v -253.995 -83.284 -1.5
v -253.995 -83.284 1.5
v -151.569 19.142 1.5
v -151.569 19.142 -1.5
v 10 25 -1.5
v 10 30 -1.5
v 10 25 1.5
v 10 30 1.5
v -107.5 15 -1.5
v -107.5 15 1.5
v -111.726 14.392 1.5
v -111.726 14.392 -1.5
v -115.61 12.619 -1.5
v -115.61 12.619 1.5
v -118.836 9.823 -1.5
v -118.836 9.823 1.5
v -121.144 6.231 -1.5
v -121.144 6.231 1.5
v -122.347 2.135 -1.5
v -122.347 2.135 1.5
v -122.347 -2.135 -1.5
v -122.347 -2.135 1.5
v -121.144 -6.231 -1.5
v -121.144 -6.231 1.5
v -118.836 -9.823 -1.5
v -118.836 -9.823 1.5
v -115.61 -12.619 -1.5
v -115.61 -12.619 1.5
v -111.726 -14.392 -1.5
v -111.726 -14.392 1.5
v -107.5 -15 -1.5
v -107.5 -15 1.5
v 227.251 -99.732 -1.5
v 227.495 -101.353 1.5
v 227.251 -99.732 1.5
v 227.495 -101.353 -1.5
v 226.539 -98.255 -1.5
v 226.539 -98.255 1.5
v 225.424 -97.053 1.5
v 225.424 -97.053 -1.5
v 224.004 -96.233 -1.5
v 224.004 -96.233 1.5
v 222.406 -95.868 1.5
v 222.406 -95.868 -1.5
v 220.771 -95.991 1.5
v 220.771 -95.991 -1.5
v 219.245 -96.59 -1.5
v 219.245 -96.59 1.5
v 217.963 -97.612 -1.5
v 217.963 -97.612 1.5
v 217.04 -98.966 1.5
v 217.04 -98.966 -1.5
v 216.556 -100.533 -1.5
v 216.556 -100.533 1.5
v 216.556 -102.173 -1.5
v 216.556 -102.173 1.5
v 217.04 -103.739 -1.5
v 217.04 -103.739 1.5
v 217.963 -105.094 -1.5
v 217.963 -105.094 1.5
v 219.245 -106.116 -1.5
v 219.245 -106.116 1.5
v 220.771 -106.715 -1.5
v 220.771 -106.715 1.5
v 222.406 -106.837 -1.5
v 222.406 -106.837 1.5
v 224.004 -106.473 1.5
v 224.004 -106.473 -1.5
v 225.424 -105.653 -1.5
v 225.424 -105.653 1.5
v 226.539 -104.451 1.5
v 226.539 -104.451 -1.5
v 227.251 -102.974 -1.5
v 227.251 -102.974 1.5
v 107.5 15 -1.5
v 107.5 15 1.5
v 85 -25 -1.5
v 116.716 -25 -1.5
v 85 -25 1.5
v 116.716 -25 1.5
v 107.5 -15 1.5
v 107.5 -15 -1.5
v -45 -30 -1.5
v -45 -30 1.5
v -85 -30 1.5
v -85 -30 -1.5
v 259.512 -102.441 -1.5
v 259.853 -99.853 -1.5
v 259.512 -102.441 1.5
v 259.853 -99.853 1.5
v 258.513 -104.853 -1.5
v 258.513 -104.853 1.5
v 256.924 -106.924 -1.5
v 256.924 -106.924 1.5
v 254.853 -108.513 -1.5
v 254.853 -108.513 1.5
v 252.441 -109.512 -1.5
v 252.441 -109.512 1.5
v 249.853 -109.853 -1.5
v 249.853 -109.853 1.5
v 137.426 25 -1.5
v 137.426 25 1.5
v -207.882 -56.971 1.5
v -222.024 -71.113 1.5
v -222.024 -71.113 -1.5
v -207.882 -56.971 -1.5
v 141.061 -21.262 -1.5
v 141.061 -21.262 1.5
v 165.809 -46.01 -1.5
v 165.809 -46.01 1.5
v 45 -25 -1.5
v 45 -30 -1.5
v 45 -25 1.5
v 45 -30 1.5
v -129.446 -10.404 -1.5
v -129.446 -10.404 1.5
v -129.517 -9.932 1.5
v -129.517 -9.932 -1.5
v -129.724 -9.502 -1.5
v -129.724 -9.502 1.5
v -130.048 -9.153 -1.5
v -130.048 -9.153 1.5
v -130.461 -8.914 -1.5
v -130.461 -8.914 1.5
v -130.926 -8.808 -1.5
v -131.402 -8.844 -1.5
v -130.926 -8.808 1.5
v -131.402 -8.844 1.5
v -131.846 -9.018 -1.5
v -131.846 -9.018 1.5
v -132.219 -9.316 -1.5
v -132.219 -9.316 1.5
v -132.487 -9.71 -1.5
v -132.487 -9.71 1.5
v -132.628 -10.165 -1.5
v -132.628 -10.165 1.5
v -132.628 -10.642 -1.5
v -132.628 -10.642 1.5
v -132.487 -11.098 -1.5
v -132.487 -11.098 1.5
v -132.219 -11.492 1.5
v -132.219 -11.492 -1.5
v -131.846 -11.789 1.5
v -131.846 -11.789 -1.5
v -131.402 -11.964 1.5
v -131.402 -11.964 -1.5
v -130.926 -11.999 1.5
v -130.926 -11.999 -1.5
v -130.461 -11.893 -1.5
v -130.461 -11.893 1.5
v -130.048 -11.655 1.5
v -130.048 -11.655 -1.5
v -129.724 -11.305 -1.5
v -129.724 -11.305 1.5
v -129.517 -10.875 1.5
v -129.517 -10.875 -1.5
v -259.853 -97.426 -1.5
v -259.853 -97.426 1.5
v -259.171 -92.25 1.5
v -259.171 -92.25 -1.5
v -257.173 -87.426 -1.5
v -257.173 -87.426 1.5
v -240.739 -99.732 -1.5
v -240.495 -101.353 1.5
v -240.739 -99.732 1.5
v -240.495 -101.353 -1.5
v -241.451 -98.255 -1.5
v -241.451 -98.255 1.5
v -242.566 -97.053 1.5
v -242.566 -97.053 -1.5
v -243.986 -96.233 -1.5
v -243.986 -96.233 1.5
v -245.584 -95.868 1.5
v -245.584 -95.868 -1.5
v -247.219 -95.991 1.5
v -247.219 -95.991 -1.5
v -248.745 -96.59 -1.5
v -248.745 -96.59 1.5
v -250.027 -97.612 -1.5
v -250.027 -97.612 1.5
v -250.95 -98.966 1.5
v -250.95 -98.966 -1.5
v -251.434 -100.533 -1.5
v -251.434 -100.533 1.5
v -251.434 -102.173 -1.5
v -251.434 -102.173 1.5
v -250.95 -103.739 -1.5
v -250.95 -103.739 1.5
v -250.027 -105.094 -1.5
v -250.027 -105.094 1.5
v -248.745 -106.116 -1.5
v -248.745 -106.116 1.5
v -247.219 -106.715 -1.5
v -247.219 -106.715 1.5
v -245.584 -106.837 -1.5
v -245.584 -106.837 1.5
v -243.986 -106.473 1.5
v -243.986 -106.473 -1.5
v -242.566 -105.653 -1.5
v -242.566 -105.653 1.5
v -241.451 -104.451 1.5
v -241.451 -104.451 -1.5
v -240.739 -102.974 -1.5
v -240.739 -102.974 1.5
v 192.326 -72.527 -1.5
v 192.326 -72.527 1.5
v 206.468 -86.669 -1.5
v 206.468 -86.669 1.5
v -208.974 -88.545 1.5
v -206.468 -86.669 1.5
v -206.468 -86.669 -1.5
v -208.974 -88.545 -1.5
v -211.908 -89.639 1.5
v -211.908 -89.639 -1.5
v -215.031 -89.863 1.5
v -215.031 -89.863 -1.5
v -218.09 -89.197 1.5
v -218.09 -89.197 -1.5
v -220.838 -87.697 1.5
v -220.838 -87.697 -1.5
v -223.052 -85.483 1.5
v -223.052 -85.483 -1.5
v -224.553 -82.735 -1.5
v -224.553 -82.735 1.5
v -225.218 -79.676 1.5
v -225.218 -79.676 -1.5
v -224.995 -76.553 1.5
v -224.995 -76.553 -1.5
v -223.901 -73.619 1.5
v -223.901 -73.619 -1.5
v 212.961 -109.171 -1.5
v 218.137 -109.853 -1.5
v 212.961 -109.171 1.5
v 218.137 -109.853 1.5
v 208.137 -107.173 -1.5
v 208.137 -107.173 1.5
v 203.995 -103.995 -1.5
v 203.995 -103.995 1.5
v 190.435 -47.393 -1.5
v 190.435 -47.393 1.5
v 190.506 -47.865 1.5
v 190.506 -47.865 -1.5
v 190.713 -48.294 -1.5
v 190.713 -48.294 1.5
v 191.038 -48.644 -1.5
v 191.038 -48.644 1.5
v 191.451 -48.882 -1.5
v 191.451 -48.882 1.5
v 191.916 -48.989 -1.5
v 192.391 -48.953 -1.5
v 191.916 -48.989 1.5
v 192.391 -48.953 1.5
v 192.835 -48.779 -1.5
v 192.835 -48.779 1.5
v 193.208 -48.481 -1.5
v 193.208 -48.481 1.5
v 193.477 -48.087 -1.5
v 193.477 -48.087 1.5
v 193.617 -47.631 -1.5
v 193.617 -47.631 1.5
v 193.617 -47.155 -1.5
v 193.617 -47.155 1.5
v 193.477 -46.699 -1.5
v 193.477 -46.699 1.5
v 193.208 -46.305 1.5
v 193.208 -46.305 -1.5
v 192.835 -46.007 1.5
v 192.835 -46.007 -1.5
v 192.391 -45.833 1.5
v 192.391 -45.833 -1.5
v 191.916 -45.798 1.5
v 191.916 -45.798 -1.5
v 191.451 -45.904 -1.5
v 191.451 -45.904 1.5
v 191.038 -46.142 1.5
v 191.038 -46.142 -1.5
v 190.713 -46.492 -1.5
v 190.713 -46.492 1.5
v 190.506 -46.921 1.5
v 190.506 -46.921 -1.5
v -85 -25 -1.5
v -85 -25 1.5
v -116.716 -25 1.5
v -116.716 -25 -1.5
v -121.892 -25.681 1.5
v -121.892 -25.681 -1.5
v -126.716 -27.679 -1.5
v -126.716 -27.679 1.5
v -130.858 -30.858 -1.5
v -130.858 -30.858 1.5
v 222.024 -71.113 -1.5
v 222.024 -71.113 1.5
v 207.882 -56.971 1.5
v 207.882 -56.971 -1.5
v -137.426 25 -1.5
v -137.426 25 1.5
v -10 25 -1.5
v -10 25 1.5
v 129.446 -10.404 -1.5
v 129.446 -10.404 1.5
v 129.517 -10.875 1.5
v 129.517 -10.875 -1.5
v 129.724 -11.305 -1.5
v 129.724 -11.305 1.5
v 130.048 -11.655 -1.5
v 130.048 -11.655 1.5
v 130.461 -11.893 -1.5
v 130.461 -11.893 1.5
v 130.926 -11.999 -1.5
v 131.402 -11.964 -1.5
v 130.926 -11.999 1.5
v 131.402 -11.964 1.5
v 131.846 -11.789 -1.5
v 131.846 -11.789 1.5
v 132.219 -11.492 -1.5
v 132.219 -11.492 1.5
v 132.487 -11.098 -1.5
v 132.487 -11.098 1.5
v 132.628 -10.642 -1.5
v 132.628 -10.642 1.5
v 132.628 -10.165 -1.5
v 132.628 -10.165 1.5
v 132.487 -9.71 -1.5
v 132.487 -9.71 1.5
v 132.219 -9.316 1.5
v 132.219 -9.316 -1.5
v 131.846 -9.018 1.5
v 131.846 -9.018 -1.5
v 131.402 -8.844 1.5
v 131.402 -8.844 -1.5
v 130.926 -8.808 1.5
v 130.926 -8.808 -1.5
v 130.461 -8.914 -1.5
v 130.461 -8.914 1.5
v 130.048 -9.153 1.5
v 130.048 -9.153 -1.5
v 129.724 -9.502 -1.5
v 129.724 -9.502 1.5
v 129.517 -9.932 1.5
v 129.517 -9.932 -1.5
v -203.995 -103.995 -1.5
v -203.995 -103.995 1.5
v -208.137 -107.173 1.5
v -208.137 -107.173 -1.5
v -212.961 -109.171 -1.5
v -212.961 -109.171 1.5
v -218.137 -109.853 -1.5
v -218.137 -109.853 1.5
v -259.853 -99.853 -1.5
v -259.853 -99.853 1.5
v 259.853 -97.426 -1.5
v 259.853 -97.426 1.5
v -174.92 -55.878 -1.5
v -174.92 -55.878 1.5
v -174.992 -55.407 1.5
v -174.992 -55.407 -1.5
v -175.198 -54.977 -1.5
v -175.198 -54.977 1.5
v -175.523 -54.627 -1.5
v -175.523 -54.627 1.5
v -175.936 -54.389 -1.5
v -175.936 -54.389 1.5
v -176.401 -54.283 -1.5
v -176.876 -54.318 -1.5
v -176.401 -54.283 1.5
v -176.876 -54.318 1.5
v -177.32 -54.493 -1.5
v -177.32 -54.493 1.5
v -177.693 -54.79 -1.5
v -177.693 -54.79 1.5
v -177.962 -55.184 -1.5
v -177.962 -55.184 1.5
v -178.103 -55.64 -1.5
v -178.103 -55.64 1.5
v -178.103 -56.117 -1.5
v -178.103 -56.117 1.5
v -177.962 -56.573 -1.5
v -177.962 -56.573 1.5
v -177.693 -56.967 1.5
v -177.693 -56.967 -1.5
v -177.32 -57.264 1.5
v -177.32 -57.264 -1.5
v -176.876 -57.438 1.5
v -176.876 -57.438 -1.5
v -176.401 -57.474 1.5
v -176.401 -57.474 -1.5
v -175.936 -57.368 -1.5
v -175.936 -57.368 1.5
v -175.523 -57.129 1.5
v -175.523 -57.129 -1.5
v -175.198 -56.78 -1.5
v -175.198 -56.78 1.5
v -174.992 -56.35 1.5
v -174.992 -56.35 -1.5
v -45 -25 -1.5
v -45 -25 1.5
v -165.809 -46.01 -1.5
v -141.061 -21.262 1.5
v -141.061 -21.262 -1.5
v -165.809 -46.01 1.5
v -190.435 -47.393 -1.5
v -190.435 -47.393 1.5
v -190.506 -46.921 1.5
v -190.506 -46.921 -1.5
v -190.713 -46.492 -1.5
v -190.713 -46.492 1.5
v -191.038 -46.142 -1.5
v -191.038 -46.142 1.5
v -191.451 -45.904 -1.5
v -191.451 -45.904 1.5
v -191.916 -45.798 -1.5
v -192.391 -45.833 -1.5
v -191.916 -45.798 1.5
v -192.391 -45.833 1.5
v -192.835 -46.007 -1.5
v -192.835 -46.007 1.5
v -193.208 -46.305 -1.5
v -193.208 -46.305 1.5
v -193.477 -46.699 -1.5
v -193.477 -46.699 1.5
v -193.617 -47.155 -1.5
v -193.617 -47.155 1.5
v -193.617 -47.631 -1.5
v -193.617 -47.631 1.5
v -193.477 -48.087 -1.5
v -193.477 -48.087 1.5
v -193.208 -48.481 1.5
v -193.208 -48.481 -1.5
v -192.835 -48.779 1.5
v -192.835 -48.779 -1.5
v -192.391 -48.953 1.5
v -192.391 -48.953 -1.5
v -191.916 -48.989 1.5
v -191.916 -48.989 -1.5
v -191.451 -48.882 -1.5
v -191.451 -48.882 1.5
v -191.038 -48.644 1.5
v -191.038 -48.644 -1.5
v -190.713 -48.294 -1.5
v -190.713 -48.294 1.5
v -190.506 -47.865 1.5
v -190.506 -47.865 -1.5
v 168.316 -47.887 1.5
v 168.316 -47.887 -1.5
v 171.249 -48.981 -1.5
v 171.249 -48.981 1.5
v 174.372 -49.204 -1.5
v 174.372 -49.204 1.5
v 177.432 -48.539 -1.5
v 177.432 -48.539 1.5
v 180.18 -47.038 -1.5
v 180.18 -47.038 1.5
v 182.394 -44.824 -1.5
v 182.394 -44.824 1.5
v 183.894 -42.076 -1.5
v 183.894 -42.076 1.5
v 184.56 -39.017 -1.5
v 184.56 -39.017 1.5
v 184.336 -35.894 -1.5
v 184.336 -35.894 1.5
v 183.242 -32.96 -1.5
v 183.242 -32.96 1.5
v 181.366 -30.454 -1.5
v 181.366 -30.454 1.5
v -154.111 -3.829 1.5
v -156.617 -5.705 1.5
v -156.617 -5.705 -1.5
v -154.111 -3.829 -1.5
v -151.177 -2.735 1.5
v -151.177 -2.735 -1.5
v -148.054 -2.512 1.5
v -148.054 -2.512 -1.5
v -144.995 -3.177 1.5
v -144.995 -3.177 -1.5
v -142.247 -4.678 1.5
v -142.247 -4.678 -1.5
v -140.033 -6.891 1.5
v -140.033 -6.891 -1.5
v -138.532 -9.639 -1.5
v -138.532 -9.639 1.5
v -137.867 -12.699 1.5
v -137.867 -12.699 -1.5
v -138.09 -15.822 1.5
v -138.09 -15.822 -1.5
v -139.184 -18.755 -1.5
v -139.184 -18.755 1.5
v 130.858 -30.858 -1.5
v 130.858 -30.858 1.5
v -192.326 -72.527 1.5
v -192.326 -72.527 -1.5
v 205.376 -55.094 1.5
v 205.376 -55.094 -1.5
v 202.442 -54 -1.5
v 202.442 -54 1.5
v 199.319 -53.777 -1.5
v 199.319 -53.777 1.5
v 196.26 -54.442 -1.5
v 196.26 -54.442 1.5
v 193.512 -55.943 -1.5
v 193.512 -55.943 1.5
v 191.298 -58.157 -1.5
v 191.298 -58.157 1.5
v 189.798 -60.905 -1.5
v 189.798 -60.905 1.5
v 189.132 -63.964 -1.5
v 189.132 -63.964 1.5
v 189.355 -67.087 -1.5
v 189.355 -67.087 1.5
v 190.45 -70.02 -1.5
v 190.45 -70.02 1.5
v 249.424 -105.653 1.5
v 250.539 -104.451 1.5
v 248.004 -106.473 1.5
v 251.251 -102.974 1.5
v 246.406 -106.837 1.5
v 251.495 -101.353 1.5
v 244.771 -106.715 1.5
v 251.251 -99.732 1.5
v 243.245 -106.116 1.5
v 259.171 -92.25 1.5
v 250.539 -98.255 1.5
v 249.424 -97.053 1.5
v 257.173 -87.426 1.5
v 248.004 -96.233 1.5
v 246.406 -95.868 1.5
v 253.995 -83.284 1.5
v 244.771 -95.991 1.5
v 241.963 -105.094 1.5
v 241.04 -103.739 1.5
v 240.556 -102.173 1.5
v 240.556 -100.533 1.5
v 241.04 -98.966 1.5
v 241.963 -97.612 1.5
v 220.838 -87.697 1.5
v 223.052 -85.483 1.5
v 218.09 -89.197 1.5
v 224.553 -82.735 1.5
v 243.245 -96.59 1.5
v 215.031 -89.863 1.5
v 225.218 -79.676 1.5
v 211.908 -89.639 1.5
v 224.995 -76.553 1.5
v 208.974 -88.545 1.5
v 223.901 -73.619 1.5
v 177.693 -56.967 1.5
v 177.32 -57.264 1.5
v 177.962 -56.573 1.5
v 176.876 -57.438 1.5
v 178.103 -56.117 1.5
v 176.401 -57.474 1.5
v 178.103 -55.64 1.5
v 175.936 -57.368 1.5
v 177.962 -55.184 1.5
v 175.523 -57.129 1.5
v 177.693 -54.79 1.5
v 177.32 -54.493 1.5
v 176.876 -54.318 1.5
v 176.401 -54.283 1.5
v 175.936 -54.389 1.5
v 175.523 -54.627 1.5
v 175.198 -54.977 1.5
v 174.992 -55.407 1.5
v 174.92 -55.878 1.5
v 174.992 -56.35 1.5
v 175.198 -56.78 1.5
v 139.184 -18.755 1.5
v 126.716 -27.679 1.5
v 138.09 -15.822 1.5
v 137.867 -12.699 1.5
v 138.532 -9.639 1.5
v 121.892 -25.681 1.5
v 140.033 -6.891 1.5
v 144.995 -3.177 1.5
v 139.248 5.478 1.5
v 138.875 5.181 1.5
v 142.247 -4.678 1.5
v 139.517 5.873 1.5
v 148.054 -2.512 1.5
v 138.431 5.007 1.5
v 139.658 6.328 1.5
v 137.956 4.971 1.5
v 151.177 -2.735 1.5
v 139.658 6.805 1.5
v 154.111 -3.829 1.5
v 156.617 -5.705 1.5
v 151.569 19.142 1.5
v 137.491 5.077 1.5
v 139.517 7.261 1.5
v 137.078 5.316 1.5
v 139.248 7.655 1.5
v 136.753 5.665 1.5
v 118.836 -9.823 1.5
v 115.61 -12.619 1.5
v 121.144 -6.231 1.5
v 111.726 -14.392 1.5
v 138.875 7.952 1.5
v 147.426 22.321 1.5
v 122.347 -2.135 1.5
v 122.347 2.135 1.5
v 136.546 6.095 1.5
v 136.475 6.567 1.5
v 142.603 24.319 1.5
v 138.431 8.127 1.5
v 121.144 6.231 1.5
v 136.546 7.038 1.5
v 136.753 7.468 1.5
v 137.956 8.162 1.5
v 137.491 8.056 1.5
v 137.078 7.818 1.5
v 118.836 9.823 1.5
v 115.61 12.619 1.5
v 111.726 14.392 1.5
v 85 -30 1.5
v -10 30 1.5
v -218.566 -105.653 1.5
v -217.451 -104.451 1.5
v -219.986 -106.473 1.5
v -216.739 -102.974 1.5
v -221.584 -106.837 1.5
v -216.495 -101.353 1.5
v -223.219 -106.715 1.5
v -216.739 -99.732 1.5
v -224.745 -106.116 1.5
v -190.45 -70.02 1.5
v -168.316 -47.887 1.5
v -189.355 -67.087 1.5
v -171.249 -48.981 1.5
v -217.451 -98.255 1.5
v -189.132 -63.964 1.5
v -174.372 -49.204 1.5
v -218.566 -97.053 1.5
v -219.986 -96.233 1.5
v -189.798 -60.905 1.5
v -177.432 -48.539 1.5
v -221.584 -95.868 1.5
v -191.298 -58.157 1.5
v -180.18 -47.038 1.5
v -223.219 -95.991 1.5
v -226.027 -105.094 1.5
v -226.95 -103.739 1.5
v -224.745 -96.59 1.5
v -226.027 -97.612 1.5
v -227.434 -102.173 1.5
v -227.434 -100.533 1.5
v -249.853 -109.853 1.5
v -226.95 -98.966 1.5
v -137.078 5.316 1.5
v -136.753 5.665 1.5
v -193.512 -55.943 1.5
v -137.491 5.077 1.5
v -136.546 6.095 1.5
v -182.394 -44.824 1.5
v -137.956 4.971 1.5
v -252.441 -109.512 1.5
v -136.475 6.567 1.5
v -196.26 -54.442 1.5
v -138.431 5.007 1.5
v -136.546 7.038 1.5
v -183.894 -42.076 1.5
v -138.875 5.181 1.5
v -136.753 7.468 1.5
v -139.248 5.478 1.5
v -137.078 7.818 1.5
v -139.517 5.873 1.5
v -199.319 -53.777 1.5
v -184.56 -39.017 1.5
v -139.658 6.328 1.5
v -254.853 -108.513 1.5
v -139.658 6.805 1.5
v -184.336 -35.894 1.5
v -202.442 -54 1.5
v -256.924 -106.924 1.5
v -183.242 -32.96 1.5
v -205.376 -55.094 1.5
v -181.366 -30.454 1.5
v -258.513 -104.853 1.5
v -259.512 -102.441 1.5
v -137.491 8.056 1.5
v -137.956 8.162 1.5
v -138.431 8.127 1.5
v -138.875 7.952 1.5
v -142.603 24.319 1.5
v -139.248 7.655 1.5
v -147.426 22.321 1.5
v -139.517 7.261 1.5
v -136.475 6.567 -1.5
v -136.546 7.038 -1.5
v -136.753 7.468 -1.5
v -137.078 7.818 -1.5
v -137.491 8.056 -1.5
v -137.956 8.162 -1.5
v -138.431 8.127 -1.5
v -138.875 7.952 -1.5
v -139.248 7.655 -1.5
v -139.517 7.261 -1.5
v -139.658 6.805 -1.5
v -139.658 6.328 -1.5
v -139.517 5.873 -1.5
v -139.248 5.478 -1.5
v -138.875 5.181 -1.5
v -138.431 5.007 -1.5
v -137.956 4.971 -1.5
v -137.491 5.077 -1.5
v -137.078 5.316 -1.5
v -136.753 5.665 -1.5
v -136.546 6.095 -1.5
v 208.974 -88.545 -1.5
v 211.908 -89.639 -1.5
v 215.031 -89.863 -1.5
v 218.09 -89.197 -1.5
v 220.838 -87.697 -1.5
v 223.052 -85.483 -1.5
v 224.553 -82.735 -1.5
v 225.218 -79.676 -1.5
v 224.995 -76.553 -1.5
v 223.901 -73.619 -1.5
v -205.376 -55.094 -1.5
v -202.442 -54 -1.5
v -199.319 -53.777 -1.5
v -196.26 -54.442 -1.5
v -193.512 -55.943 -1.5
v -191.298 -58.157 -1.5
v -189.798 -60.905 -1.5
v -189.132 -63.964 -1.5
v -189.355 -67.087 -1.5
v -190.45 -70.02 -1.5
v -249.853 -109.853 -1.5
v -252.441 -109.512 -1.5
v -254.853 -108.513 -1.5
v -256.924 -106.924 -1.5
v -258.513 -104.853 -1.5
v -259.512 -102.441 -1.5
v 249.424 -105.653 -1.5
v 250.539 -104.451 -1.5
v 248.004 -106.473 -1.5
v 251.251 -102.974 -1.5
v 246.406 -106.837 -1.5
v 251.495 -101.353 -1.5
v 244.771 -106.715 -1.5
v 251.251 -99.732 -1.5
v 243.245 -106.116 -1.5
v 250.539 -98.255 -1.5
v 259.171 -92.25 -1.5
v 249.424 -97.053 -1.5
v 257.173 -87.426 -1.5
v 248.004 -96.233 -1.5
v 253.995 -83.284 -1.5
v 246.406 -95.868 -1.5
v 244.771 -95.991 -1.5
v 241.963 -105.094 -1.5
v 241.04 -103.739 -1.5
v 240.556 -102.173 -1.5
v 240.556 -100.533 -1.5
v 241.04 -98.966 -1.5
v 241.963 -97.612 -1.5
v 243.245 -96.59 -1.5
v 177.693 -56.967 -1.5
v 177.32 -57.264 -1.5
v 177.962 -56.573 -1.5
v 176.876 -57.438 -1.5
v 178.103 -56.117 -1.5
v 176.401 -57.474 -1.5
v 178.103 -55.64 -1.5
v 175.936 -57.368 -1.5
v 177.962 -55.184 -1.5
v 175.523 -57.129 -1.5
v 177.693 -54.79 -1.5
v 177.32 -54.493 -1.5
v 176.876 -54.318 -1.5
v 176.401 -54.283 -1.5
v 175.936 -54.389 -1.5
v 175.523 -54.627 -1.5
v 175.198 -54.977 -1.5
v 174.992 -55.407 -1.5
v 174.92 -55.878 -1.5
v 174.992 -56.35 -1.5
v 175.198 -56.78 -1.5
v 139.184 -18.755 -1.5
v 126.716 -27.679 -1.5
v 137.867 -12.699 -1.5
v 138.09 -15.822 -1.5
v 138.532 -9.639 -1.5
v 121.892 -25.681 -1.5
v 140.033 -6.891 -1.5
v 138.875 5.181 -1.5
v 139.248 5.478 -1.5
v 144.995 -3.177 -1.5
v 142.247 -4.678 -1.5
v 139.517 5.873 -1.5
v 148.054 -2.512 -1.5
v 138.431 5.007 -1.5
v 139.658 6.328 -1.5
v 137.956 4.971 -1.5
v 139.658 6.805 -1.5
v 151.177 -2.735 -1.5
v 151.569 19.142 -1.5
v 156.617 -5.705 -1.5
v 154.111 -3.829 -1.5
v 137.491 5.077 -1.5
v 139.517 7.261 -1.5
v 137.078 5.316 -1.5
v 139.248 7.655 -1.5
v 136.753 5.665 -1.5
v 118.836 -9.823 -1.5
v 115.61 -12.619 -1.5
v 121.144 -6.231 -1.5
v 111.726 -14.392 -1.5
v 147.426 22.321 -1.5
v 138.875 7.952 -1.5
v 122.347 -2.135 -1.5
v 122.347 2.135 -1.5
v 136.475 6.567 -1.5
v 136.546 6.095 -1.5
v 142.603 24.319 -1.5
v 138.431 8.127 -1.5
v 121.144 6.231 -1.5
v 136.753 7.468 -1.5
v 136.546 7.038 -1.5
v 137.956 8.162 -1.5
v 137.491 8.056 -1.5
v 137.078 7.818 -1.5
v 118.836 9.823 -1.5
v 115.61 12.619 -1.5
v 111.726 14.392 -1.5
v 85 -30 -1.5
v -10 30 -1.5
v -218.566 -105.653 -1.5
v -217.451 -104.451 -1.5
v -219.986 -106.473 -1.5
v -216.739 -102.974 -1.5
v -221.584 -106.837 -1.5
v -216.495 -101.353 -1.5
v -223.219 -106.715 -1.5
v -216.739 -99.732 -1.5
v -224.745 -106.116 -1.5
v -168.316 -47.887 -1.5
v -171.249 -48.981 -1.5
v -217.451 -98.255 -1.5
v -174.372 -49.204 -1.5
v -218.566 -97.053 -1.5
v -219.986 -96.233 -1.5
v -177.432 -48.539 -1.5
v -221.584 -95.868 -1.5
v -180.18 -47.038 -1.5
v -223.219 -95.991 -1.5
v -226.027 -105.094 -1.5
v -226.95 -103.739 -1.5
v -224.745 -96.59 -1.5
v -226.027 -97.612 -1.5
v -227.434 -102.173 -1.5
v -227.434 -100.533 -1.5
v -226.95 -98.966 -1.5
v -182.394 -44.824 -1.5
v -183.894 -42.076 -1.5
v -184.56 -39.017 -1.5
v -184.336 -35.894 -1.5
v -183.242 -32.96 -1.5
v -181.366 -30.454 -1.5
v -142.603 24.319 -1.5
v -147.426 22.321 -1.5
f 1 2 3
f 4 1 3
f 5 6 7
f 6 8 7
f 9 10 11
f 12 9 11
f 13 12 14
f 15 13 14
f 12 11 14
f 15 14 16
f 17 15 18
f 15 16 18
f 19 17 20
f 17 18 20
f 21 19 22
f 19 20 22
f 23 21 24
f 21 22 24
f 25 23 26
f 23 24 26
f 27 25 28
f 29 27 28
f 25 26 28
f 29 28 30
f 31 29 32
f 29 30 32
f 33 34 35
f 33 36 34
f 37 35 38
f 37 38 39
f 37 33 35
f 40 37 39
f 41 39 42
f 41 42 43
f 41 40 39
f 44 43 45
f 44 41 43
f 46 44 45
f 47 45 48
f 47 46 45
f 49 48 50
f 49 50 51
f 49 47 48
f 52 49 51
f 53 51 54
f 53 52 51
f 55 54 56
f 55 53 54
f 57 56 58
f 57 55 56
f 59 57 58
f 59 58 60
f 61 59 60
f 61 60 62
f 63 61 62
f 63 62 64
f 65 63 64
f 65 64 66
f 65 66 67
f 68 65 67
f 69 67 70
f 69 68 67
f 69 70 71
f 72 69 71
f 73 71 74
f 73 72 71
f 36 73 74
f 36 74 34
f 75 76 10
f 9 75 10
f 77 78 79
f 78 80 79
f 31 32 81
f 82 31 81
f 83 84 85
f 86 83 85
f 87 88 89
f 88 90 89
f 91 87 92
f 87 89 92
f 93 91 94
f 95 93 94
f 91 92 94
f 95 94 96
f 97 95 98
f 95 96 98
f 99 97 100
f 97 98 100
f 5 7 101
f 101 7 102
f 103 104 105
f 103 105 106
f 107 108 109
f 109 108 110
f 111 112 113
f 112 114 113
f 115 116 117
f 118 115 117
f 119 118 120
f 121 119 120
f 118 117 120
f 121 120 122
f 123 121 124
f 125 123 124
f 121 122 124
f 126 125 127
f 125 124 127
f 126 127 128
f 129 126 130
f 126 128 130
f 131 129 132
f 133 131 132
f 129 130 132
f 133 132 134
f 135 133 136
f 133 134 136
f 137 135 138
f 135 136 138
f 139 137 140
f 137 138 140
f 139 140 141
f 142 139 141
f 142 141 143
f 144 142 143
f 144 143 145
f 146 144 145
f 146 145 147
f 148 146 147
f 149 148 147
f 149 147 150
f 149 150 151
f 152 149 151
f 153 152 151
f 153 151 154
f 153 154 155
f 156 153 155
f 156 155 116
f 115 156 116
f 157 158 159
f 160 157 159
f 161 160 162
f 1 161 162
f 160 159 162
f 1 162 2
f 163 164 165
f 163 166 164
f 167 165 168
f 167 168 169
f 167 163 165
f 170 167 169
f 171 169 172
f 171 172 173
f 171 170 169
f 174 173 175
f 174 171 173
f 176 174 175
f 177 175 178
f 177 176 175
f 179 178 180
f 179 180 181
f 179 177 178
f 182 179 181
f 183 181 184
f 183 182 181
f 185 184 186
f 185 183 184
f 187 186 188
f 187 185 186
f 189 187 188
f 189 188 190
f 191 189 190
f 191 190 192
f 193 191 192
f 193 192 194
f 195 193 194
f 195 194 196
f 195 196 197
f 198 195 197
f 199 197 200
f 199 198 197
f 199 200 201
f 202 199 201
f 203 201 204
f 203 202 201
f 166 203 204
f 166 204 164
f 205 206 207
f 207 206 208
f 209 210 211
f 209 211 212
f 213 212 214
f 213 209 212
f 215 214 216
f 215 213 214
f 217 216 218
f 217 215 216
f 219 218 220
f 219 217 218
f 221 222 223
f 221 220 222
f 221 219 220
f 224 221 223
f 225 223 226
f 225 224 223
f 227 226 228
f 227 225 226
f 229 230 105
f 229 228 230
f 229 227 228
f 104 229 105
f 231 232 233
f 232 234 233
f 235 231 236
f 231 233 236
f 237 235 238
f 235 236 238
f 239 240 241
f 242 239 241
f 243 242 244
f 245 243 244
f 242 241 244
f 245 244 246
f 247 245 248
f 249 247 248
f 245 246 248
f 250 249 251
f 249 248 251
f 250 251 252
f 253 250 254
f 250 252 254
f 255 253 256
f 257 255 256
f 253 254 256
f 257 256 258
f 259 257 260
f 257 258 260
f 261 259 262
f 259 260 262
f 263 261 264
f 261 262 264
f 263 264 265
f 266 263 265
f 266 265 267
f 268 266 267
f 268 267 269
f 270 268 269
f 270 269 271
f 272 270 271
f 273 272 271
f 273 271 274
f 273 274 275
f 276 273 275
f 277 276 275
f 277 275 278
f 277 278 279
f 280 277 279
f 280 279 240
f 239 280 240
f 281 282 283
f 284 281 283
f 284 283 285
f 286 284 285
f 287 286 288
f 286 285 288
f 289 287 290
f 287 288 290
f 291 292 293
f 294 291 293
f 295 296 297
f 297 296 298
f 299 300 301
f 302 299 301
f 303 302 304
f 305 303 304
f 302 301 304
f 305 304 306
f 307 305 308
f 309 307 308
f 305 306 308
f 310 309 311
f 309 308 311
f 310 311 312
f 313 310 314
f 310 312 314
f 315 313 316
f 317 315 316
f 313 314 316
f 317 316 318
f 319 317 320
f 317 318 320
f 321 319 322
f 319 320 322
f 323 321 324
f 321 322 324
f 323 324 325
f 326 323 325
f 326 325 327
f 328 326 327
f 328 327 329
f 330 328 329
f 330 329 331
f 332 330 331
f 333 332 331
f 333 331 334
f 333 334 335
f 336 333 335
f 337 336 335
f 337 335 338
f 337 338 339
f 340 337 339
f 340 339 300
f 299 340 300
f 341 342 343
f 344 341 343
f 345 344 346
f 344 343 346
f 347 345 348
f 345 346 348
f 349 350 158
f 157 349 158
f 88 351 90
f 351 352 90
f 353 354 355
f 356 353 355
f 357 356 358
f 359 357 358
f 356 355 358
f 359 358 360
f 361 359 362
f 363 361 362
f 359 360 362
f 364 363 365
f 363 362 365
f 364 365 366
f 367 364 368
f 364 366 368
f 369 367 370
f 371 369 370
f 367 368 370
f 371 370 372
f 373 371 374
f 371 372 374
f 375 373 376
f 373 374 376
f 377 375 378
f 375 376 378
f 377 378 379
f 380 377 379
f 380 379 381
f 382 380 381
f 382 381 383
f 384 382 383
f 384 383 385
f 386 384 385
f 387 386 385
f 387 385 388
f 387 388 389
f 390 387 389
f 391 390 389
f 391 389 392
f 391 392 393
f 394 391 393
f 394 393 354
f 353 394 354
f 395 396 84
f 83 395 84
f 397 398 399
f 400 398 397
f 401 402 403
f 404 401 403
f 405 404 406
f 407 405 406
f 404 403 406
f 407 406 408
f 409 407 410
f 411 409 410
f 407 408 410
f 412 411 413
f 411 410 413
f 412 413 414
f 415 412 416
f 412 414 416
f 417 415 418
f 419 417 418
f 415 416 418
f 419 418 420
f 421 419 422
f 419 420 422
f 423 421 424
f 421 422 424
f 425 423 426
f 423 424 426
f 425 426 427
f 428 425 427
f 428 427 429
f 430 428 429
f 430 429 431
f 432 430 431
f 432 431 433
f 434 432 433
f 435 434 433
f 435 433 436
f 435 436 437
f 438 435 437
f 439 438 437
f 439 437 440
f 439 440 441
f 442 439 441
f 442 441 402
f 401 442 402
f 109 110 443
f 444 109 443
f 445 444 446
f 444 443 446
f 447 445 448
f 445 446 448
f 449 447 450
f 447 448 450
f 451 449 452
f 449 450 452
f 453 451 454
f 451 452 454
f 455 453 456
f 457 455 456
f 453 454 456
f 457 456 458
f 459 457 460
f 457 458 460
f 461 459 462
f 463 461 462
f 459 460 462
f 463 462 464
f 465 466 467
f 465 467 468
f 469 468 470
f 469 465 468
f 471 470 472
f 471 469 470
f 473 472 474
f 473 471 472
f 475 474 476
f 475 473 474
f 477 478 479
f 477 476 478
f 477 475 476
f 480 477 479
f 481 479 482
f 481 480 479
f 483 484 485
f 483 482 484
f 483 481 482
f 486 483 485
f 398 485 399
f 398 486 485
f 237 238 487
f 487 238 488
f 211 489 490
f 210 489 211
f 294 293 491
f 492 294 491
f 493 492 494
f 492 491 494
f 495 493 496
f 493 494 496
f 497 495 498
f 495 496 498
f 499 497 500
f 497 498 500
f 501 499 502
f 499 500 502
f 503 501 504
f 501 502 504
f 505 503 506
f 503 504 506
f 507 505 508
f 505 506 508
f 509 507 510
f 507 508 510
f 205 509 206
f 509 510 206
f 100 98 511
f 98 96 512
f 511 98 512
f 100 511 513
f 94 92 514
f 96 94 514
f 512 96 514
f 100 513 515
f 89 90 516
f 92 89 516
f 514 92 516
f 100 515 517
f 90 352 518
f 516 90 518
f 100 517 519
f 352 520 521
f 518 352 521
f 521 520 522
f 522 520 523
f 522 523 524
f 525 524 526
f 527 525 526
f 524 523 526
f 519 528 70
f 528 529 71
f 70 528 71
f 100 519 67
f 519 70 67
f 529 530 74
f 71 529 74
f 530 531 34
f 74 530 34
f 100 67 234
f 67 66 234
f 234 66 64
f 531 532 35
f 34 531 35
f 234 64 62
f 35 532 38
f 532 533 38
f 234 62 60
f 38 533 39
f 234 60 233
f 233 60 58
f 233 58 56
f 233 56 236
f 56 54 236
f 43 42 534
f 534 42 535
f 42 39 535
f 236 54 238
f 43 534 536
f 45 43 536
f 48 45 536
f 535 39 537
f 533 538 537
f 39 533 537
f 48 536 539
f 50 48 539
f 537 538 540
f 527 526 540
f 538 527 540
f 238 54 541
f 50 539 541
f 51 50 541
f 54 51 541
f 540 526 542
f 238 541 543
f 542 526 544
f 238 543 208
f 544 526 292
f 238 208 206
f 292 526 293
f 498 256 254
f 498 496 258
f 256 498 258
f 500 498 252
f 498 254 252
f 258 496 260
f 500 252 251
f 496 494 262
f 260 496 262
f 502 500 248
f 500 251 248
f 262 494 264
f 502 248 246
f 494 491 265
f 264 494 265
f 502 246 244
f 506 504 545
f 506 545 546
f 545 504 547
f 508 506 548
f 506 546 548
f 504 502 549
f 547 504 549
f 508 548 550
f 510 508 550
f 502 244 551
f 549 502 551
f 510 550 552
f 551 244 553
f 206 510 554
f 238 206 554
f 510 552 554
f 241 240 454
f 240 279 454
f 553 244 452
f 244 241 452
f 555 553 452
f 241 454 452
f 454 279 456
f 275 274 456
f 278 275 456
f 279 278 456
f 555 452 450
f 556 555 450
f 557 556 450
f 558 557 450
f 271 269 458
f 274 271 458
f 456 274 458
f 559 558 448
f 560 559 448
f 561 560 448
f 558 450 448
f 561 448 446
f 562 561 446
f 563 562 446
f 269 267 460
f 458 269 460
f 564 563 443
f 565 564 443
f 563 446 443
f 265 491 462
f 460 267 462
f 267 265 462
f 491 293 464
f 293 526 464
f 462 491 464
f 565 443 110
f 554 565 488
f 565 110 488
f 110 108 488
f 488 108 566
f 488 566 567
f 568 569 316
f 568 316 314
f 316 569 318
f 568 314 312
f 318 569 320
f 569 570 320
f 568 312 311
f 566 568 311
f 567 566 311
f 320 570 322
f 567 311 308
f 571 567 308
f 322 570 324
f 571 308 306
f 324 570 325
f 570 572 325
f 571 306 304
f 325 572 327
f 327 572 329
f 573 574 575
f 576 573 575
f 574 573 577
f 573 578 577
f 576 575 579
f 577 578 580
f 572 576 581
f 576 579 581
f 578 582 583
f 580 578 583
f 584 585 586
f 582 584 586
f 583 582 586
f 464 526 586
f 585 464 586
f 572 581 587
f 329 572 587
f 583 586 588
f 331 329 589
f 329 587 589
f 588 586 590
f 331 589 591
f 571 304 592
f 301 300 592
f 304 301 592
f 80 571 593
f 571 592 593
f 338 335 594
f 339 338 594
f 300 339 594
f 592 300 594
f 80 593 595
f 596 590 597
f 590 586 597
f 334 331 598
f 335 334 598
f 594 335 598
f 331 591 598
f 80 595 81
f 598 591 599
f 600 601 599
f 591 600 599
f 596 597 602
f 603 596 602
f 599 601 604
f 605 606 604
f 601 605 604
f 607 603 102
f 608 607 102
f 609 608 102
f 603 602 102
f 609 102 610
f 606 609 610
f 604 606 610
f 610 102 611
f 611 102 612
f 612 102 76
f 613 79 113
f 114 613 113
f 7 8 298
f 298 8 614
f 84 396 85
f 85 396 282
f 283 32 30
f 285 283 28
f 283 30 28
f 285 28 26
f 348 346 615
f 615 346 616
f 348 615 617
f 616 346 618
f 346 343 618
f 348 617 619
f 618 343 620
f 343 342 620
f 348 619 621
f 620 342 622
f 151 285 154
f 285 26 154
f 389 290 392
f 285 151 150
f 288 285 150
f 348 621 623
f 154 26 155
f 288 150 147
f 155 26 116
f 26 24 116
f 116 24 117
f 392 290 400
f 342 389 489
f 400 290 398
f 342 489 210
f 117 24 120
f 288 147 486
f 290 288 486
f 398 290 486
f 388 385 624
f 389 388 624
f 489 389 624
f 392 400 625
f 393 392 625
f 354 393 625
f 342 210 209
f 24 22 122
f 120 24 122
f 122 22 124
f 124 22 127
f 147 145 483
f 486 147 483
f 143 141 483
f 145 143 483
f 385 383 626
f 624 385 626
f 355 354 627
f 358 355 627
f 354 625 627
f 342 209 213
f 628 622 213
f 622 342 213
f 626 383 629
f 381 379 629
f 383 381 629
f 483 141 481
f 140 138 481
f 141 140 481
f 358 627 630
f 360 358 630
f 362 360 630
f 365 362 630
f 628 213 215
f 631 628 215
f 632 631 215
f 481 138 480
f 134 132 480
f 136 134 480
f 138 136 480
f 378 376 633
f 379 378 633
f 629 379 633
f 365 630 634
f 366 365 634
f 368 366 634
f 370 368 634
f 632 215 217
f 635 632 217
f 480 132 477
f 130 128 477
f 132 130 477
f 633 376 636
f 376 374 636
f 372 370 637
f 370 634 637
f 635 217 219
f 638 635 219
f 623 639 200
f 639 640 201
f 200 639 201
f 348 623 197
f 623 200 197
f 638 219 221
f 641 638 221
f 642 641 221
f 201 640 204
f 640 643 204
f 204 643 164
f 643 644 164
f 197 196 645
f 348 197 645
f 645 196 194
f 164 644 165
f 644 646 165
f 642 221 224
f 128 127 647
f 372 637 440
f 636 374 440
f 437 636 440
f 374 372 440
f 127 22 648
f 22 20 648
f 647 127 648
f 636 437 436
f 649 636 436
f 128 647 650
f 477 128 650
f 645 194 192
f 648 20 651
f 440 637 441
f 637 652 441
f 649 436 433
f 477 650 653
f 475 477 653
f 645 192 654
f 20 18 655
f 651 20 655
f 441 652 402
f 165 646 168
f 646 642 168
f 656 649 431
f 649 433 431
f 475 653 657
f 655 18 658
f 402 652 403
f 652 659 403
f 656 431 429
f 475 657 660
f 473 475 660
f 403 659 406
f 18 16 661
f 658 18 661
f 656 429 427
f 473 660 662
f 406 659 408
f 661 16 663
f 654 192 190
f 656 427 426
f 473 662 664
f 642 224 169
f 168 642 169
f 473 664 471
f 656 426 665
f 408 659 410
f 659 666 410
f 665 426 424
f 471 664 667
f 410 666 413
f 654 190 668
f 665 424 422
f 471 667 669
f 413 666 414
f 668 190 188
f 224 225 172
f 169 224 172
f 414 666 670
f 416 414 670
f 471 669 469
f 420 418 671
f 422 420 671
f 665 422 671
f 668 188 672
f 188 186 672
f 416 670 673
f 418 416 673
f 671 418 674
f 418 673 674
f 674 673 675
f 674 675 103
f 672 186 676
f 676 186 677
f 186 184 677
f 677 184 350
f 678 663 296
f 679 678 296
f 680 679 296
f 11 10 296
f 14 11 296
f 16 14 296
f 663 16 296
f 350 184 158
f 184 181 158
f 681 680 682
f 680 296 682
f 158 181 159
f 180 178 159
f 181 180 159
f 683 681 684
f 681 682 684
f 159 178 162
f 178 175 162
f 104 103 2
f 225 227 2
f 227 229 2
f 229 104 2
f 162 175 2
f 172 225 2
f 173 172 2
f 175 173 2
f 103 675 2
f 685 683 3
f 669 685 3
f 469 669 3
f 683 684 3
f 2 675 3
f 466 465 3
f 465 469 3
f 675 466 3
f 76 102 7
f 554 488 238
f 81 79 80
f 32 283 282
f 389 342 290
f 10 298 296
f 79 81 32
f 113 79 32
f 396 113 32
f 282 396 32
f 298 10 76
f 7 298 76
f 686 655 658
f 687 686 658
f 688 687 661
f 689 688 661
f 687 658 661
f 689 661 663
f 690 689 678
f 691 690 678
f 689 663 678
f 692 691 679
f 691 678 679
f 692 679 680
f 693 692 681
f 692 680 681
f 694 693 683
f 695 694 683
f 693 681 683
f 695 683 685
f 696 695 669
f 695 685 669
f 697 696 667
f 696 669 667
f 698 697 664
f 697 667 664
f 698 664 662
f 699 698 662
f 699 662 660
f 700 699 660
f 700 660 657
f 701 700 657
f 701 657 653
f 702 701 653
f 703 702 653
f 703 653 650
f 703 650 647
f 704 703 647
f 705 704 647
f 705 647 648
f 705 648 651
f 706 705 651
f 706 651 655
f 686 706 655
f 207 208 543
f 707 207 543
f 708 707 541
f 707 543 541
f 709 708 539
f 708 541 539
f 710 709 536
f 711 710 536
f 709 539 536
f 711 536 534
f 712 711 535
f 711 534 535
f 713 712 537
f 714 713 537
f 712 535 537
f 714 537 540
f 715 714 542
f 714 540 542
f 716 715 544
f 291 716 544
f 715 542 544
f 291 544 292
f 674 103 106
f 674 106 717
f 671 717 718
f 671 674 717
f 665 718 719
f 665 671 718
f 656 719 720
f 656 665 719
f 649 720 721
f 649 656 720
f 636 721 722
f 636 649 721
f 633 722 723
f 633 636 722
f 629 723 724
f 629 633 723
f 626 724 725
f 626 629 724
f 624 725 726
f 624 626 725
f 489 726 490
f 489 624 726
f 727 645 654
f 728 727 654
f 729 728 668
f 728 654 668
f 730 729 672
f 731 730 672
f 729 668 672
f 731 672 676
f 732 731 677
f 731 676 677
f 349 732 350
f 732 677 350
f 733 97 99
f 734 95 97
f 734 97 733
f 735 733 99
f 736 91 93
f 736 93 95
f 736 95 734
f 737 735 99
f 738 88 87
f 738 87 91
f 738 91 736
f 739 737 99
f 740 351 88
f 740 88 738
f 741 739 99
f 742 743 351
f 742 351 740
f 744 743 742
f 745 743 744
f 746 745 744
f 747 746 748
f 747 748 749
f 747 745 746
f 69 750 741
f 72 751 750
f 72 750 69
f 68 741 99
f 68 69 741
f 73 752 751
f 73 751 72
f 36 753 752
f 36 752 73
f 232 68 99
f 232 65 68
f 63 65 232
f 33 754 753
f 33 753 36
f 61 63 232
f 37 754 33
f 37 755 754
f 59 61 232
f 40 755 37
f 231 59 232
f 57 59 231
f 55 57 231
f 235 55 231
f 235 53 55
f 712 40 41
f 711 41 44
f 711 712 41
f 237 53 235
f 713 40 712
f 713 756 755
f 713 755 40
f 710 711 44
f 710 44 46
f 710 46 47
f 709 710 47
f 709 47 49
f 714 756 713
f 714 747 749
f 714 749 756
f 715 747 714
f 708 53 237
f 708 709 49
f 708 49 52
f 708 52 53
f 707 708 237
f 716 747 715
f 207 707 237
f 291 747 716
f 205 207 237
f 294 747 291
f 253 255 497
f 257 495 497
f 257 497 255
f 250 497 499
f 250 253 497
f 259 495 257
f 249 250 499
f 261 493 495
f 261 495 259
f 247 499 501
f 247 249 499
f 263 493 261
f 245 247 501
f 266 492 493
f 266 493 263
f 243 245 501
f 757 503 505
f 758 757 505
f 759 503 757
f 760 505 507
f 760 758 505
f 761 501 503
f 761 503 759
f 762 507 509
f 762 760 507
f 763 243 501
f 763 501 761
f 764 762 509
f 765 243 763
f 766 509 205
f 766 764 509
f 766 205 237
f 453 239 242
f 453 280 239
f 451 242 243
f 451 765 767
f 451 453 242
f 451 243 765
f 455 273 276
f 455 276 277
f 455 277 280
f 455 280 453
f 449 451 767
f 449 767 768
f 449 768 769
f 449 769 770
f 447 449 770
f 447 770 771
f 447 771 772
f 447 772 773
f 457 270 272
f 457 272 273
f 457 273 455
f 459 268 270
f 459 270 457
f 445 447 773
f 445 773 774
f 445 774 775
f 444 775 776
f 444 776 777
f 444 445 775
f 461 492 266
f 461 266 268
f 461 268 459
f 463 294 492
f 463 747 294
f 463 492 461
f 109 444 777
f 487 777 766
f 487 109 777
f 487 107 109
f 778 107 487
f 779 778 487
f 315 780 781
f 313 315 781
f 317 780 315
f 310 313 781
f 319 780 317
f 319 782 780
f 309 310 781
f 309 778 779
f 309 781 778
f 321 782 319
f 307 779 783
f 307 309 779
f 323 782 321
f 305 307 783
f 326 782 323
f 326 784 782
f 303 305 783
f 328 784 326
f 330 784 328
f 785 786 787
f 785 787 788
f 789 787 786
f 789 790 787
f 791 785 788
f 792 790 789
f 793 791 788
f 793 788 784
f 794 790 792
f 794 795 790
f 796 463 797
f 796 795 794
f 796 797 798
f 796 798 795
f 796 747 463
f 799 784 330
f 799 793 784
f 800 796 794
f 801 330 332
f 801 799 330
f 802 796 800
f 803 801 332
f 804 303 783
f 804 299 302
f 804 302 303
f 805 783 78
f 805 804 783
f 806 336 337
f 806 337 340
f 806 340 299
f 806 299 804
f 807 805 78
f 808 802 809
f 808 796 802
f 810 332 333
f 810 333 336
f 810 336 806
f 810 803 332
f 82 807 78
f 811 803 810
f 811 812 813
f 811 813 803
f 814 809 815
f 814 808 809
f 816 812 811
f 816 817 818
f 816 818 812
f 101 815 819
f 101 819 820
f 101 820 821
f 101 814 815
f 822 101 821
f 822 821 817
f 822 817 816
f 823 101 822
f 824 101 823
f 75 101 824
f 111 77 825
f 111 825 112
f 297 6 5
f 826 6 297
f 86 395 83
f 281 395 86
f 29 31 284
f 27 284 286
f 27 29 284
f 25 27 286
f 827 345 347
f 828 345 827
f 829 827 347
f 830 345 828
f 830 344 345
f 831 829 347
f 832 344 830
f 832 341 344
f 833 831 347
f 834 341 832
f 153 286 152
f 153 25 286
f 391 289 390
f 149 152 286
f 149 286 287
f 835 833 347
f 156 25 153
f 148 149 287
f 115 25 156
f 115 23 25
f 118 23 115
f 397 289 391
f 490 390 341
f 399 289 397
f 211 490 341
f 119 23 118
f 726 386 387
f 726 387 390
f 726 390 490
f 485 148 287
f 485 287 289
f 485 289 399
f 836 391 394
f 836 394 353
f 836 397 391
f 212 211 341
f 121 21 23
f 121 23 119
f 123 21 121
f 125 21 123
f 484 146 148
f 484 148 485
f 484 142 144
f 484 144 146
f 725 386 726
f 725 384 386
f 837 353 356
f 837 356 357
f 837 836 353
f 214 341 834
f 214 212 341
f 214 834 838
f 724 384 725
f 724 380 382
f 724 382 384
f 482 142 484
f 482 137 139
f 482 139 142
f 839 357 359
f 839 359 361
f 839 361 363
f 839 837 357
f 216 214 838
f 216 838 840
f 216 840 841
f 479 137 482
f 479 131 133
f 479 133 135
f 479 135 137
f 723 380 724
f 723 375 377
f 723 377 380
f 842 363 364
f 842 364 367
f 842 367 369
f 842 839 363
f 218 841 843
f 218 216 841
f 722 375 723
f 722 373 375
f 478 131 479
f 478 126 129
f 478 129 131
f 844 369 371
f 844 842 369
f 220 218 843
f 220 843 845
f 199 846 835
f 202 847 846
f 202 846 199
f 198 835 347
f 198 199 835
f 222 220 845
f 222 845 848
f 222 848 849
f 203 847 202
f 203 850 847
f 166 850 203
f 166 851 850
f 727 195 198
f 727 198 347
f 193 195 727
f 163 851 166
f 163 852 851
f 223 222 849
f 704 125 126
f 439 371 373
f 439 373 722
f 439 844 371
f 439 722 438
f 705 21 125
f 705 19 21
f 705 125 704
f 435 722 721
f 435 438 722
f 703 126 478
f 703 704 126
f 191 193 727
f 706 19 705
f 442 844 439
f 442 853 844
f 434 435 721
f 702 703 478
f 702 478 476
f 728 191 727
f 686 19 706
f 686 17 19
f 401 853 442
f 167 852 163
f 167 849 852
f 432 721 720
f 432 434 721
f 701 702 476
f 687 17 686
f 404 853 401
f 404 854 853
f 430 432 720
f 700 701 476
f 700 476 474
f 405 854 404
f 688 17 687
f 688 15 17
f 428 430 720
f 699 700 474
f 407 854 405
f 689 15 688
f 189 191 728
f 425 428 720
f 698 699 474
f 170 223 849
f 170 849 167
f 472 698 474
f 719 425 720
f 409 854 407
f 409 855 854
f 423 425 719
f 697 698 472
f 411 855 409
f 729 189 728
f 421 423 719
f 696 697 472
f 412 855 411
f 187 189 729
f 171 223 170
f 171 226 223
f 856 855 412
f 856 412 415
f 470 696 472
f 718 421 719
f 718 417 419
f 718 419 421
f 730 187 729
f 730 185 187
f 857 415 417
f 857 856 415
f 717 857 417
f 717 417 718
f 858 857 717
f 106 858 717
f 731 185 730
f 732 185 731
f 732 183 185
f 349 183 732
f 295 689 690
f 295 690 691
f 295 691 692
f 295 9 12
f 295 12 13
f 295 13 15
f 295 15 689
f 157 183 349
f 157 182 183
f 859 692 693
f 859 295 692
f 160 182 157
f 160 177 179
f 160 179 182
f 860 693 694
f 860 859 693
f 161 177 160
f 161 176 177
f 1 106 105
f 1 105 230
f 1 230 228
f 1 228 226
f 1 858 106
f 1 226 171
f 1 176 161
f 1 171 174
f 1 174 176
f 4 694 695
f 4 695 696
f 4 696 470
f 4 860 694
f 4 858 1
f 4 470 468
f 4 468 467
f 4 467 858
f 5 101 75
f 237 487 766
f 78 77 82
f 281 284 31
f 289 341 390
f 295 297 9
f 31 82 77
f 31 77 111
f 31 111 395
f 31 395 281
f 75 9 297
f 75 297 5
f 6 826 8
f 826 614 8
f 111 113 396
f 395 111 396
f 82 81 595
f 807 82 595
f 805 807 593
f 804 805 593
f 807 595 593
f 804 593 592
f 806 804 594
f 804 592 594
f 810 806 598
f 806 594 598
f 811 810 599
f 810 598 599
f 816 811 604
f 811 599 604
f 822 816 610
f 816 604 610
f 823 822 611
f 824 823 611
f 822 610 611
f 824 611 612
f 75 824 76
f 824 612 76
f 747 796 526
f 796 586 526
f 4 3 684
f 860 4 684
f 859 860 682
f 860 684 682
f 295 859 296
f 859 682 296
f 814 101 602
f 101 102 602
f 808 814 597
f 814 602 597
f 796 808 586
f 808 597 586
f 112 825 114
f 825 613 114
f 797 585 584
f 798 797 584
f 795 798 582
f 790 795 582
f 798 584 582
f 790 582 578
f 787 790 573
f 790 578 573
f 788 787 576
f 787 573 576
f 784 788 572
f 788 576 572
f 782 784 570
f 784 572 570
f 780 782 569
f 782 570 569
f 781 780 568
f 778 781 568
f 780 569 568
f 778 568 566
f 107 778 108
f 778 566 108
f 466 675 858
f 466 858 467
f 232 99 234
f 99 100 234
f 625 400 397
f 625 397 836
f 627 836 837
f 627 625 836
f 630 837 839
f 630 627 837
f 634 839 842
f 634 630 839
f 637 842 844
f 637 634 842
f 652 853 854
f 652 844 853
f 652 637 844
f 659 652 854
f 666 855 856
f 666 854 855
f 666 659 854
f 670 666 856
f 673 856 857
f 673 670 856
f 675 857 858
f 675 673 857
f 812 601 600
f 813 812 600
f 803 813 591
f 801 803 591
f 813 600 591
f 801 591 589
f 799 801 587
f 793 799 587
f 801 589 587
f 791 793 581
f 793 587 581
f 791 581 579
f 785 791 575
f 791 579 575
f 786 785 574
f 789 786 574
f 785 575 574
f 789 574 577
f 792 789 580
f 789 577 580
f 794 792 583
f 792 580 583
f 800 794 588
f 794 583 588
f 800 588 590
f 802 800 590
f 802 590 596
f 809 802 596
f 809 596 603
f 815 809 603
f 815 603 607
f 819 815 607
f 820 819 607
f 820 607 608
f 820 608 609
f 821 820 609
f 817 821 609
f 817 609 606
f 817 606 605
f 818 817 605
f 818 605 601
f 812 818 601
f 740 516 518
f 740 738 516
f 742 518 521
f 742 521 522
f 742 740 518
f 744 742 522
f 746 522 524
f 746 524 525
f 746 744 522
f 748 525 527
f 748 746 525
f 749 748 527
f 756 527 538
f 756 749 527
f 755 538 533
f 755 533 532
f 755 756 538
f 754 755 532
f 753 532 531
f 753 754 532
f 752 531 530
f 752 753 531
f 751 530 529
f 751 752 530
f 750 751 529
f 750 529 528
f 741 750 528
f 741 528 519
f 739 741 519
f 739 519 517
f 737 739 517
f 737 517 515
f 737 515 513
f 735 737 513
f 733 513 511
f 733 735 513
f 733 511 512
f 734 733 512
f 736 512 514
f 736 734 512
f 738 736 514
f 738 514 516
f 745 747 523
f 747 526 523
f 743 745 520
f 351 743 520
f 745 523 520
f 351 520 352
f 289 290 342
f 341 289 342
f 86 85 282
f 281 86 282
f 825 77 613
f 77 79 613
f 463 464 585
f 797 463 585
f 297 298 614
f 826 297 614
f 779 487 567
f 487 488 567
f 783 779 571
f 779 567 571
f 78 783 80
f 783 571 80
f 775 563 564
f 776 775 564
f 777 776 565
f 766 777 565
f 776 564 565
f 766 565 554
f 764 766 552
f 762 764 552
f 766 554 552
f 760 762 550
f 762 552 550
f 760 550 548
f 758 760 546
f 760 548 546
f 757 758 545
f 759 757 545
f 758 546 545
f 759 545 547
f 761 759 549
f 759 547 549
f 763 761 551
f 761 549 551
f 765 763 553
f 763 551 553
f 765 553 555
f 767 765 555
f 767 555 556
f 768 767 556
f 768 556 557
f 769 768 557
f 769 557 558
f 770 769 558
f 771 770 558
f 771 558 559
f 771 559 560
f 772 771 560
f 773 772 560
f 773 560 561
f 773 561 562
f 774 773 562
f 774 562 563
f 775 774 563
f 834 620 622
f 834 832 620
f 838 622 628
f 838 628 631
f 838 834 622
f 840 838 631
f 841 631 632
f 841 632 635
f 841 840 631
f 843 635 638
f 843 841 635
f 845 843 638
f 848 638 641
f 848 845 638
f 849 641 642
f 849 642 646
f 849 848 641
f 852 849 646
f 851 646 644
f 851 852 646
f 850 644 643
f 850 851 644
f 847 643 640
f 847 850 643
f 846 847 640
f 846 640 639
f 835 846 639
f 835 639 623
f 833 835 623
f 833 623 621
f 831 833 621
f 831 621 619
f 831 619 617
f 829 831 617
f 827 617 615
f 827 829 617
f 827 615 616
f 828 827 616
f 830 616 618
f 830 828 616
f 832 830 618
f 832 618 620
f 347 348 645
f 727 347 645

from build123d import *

# Parameters (mm, degrees)
SKETCH_1_R          = 5.5
EXTRUDE_1_DEPTH     = 1.5
CUT_EXTRUDE_6_DEPTH = 283.134941999
SKETCH_2_5_R        = 1.6
CUT_EXTRUDE_7_DEPTH = 283.134941999


with BuildPart() as part:
    # 草图1 → 凸台-拉伸1 (new, symmetric)
    with BuildSketch(Plane.XY):
        with BuildLine():
            Line((-10, 25), (-125, 25))
            Line((-125, 25), (-137.426406871, 25))
            ThreePointArc((-137.426406871, 25), (-145.080075518, 23.47759065), (-151.568542495, 19.142135624))
            Line((-151.568542495, 19.142135624), (-202.781745931, -32.071067812))
            Line((-202.781745931, -32.071067812), (-253.994949366, -83.284271247))
            ThreePointArc((-253.994949366, -83.284271247), (-258.330404393, -89.772738224), (-259.852813742, -97.426406871))
            Line((-259.852813742, -97.426406871), (-259.852813742, -99.852813742))
            ThreePointArc((-259.852813742, -99.852813742), (-256.923881554, -106.923881554), (-249.852813742, -109.852813742))
            Line((-249.852813742, -109.852813742), (-245.994949366, -109.852813742))
            Line((-245.994949366, -109.852813742), (-233.994949366, -109.852813742))
            Line((-233.994949366, -109.852813742), (-218.13708499, -109.852813742))
            ThreePointArc((-218.13708499, -109.852813742), (-210.483416343, -108.330404393), (-203.994949366, -103.994949366))
            Line((-203.994949366, -103.994949366), (-130.857864376, -30.857864376))
            ThreePointArc((-130.857864376, -30.857864376), (-124.3693974, -26.52240935), (-116.715728753, -25))
            Line((-116.715728753, -25), (-85, -25))
            Line((-85, -25), (-85, -30))
            Line((-85, -30), (-65, -30))
            Line((-65, -30), (-45, -30))
            Line((-45, -30), (-45, -25))
            Line((-45, -25), (0, -25))
            Line((0, -25), (45, -25))
            Line((45, -25), (45, -30))
            Line((45, -30), (65, -30))
            Line((65, -30), (85, -30))
            Line((85, -30), (85, -25))
            Line((85, -25), (116.715728753, -25))
            ThreePointArc((116.715728753, -25), (124.3693974, -26.52240935), (130.857864376, -30.857864376))
            Line((130.857864376, -30.857864376), (203.994949366, -103.994949366))
            ThreePointArc((203.994949366, -103.994949366), (210.483416343, -108.330404393), (218.13708499, -109.852813742))
            Line((218.13708499, -109.852813742), (249.852813742, -109.852813742))
            ThreePointArc((249.852813742, -109.852813742), (256.923881554, -106.923881554), (259.852813742, -99.852813742))
            Line((259.852813742, -99.852813742), (259.852813742, -97.426406871))
            ThreePointArc((259.852813742, -97.426406871), (258.330404393, -89.772738224), (253.994949366, -83.284271247))
            Line((253.994949366, -83.284271247), (202.781745931, -32.071067812))
            Line((202.781745931, -32.071067812), (151.568542495, 19.142135624))
            ThreePointArc((151.568542495, 19.142135624), (145.080075518, 23.47759065), (137.426406871, 25))
            Line((137.426406871, 25), (125, 25))
            Line((125, 25), (10, 25))
            Line((10, 25), (10, 30))
            Line((10, 30), (-10, 30))
            Line((-10, 30), (-10, 25))
        make_face()
        with BuildLine():
            ThreePointArc((-240.494949366, -101.352813742), (-242.10586207, -105.241901039), (-245.994949366, -106.852813742))
            ThreePointArc((-245.994949366, -106.852813742), (-249.884036663, -97.463726446), (-240.494949366, -101.352813742))
        make_face(mode=Mode.SUBTRACT)
        with Locations((-221.994949366, -101.352813742)):
            Circle(SKETCH_1_R, mode=Mode.SUBTRACT)
        with Locations((221.994949366, -101.352813742)):
            Circle(SKETCH_1_R, mode=Mode.SUBTRACT)
        with Locations((245.994949366, -101.352813742)):
            Circle(SKETCH_1_R, mode=Mode.SUBTRACT)
    extrude(amount=EXTRUDE_1_DEPTH, both=True)

    # 草图2 → 切除-拉伸6 (cut, through all)
    with BuildSketch(Plane.XY.offset(1.5)):
        with BuildLine():
            Line((107.5, 15), (-107.5, 15))
            ThreePointArc((-107.5, 15), (-122.5, 0), (-107.5, -15))
            Line((-107.5, -15), (107.5, -15))
            ThreePointArc((107.5, -15), (122.5, 0), (107.5, 15))
        make_face()
    extrude(amount=-CUT_EXTRUDE_6_DEPTH, mode=Mode.SUBTRACT)

    # 草图2<5> → 切除-拉伸7 (cut, through all)
    with BuildSketch(Plane.XY.offset(1.5)):
        with Locations((-138.075378798, 6.566756826)):
            Circle(SKETCH_2_5_R)
        with Locations((-131.045941546, -10.403805922)):
            Circle(SKETCH_2_5_R)
        with Locations((-176.520445456, -55.878309832)):
            Circle(SKETCH_2_5_R)
        with Locations((-192.035164082, -47.393028458)):
            Circle(SKETCH_2_5_R)
        with Locations((131.045941546, -10.403805922)):
            Circle(SKETCH_2_5_R)
        with Locations((138.075378798, 6.566756826)):
            Circle(SKETCH_2_5_R)
        with Locations((176.520445456, -55.878309832)):
            Circle(SKETCH_2_5_R)
        with Locations((192.035164082, -47.393028458)):
            Circle(SKETCH_2_5_R)
        with BuildLine():
            Line((-141.060660172, -21.261670299), (-165.809397513, -46.01040764))
            ThreePointArc((-165.809397513, -46.01040764), (-181.365746699, -46.01040764), (-181.365746699, -30.454058454))
            Line((-181.365746699, -30.454058454), (-156.617009358, -5.705321112))
            ThreePointArc((-156.617009358, -5.705321112), (-141.060660172, -5.705321112), (-141.060660172, -21.261670299))
        make_face()
        with BuildLine():
            Line((-222.024386618, -71.112698372), (-207.882250994, -56.970562748))
            ThreePointArc((-207.882250994, -56.970562748), (-192.325901808, -56.970562748), (-192.325901808, -72.526911935))
            Line((-192.325901808, -72.526911935), (-206.468037432, -86.669047558))
            ThreePointArc((-206.468037432, -86.669047558), (-222.024386618, -86.669047558), (-222.024386618, -71.112698372))
        make_face()
        with BuildLine():
            Line((141.060660172, -21.261670299), (165.809397513, -46.01040764))
            ThreePointArc((165.809397513, -46.01040764), (181.365746699, -46.01040764), (181.365746699, -30.454058454))
            Line((181.365746699, -30.454058454), (156.617009358, -5.705321112))
            ThreePointArc((156.617009358, -5.705321112), (141.060660172, -5.705321112), (141.060660172, -21.261670299))
        make_face()
        with BuildLine():
            Line((222.024386618, -71.112698372), (207.882250994, -56.970562748))
            ThreePointArc((207.882250994, -56.970562748), (192.325901808, -56.970562748), (192.325901808, -72.526911935))
            Line((192.325901808, -72.526911935), (206.468037432, -86.669047558))
            ThreePointArc((206.468037432, -86.669047558), (222.024386618, -86.669047558), (222.024386618, -71.112698372))
        make_face()
    extrude(amount=-CUT_EXTRUDE_7_DEPTH, mode=Mode.SUBTRACT)


solid = part.part
